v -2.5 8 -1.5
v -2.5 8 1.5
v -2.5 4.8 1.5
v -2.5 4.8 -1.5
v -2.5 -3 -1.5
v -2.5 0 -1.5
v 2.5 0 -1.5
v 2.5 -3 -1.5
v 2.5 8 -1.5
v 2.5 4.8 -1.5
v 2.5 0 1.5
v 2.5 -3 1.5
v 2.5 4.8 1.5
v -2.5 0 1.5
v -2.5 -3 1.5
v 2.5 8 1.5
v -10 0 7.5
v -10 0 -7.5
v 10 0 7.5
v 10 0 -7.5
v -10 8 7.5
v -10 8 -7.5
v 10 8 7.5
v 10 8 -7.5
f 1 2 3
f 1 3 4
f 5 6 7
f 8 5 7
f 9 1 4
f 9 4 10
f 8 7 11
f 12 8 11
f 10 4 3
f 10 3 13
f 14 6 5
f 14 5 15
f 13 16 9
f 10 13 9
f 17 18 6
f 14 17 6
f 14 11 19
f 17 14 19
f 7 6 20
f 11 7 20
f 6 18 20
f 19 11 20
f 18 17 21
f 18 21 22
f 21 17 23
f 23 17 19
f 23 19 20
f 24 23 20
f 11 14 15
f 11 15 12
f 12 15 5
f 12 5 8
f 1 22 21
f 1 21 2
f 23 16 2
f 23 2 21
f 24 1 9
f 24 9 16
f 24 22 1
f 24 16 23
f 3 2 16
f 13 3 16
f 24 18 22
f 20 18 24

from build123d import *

# Parameters (mm, degrees)
SKETCH1_W           = 20
SKETCH1_H           = 15
BOSS_EXTRUDE1_DEPTH = 8
SKETCH2_W           = 5
SKETCH2_H           = 3
CUT_EXTRUDE1_DEPTH  = 3.2
SKETCH3_W           = 5
SKETCH3_H           = 3
BOSS_EXTRUDE2_DEPTH = 3


with BuildPart() as part:
    # Sketch1 → Boss-Extrude1 (new body)
    with BuildSketch(Plane(origin=(0, 0, 0), x_dir=(1, 0, 0), z_dir=(0, 1, 0))):
        Rectangle(SKETCH1_W, SKETCH1_H)
    extrude(amount=BOSS_EXTRUDE1_DEPTH)

    # Sketch2 → Cut-Extrude1 (cut)
    with BuildSketch(Plane(origin=(0, 8, 0), x_dir=(1, 0, 0), z_dir=(0, 1, 0))):
        Rectangle(SKETCH2_W, SKETCH2_H)
    extrude(amount=-CUT_EXTRUDE1_DEPTH, mode=Mode.SUBTRACT)

    # Sketch3 → Boss-Extrude2 (add)
    with BuildSketch(Plane.XZ):
        Rectangle(SKETCH3_W, SKETCH3_H)
    extrude(amount=BOSS_EXTRUDE2_DEPTH)


solid = part.part
